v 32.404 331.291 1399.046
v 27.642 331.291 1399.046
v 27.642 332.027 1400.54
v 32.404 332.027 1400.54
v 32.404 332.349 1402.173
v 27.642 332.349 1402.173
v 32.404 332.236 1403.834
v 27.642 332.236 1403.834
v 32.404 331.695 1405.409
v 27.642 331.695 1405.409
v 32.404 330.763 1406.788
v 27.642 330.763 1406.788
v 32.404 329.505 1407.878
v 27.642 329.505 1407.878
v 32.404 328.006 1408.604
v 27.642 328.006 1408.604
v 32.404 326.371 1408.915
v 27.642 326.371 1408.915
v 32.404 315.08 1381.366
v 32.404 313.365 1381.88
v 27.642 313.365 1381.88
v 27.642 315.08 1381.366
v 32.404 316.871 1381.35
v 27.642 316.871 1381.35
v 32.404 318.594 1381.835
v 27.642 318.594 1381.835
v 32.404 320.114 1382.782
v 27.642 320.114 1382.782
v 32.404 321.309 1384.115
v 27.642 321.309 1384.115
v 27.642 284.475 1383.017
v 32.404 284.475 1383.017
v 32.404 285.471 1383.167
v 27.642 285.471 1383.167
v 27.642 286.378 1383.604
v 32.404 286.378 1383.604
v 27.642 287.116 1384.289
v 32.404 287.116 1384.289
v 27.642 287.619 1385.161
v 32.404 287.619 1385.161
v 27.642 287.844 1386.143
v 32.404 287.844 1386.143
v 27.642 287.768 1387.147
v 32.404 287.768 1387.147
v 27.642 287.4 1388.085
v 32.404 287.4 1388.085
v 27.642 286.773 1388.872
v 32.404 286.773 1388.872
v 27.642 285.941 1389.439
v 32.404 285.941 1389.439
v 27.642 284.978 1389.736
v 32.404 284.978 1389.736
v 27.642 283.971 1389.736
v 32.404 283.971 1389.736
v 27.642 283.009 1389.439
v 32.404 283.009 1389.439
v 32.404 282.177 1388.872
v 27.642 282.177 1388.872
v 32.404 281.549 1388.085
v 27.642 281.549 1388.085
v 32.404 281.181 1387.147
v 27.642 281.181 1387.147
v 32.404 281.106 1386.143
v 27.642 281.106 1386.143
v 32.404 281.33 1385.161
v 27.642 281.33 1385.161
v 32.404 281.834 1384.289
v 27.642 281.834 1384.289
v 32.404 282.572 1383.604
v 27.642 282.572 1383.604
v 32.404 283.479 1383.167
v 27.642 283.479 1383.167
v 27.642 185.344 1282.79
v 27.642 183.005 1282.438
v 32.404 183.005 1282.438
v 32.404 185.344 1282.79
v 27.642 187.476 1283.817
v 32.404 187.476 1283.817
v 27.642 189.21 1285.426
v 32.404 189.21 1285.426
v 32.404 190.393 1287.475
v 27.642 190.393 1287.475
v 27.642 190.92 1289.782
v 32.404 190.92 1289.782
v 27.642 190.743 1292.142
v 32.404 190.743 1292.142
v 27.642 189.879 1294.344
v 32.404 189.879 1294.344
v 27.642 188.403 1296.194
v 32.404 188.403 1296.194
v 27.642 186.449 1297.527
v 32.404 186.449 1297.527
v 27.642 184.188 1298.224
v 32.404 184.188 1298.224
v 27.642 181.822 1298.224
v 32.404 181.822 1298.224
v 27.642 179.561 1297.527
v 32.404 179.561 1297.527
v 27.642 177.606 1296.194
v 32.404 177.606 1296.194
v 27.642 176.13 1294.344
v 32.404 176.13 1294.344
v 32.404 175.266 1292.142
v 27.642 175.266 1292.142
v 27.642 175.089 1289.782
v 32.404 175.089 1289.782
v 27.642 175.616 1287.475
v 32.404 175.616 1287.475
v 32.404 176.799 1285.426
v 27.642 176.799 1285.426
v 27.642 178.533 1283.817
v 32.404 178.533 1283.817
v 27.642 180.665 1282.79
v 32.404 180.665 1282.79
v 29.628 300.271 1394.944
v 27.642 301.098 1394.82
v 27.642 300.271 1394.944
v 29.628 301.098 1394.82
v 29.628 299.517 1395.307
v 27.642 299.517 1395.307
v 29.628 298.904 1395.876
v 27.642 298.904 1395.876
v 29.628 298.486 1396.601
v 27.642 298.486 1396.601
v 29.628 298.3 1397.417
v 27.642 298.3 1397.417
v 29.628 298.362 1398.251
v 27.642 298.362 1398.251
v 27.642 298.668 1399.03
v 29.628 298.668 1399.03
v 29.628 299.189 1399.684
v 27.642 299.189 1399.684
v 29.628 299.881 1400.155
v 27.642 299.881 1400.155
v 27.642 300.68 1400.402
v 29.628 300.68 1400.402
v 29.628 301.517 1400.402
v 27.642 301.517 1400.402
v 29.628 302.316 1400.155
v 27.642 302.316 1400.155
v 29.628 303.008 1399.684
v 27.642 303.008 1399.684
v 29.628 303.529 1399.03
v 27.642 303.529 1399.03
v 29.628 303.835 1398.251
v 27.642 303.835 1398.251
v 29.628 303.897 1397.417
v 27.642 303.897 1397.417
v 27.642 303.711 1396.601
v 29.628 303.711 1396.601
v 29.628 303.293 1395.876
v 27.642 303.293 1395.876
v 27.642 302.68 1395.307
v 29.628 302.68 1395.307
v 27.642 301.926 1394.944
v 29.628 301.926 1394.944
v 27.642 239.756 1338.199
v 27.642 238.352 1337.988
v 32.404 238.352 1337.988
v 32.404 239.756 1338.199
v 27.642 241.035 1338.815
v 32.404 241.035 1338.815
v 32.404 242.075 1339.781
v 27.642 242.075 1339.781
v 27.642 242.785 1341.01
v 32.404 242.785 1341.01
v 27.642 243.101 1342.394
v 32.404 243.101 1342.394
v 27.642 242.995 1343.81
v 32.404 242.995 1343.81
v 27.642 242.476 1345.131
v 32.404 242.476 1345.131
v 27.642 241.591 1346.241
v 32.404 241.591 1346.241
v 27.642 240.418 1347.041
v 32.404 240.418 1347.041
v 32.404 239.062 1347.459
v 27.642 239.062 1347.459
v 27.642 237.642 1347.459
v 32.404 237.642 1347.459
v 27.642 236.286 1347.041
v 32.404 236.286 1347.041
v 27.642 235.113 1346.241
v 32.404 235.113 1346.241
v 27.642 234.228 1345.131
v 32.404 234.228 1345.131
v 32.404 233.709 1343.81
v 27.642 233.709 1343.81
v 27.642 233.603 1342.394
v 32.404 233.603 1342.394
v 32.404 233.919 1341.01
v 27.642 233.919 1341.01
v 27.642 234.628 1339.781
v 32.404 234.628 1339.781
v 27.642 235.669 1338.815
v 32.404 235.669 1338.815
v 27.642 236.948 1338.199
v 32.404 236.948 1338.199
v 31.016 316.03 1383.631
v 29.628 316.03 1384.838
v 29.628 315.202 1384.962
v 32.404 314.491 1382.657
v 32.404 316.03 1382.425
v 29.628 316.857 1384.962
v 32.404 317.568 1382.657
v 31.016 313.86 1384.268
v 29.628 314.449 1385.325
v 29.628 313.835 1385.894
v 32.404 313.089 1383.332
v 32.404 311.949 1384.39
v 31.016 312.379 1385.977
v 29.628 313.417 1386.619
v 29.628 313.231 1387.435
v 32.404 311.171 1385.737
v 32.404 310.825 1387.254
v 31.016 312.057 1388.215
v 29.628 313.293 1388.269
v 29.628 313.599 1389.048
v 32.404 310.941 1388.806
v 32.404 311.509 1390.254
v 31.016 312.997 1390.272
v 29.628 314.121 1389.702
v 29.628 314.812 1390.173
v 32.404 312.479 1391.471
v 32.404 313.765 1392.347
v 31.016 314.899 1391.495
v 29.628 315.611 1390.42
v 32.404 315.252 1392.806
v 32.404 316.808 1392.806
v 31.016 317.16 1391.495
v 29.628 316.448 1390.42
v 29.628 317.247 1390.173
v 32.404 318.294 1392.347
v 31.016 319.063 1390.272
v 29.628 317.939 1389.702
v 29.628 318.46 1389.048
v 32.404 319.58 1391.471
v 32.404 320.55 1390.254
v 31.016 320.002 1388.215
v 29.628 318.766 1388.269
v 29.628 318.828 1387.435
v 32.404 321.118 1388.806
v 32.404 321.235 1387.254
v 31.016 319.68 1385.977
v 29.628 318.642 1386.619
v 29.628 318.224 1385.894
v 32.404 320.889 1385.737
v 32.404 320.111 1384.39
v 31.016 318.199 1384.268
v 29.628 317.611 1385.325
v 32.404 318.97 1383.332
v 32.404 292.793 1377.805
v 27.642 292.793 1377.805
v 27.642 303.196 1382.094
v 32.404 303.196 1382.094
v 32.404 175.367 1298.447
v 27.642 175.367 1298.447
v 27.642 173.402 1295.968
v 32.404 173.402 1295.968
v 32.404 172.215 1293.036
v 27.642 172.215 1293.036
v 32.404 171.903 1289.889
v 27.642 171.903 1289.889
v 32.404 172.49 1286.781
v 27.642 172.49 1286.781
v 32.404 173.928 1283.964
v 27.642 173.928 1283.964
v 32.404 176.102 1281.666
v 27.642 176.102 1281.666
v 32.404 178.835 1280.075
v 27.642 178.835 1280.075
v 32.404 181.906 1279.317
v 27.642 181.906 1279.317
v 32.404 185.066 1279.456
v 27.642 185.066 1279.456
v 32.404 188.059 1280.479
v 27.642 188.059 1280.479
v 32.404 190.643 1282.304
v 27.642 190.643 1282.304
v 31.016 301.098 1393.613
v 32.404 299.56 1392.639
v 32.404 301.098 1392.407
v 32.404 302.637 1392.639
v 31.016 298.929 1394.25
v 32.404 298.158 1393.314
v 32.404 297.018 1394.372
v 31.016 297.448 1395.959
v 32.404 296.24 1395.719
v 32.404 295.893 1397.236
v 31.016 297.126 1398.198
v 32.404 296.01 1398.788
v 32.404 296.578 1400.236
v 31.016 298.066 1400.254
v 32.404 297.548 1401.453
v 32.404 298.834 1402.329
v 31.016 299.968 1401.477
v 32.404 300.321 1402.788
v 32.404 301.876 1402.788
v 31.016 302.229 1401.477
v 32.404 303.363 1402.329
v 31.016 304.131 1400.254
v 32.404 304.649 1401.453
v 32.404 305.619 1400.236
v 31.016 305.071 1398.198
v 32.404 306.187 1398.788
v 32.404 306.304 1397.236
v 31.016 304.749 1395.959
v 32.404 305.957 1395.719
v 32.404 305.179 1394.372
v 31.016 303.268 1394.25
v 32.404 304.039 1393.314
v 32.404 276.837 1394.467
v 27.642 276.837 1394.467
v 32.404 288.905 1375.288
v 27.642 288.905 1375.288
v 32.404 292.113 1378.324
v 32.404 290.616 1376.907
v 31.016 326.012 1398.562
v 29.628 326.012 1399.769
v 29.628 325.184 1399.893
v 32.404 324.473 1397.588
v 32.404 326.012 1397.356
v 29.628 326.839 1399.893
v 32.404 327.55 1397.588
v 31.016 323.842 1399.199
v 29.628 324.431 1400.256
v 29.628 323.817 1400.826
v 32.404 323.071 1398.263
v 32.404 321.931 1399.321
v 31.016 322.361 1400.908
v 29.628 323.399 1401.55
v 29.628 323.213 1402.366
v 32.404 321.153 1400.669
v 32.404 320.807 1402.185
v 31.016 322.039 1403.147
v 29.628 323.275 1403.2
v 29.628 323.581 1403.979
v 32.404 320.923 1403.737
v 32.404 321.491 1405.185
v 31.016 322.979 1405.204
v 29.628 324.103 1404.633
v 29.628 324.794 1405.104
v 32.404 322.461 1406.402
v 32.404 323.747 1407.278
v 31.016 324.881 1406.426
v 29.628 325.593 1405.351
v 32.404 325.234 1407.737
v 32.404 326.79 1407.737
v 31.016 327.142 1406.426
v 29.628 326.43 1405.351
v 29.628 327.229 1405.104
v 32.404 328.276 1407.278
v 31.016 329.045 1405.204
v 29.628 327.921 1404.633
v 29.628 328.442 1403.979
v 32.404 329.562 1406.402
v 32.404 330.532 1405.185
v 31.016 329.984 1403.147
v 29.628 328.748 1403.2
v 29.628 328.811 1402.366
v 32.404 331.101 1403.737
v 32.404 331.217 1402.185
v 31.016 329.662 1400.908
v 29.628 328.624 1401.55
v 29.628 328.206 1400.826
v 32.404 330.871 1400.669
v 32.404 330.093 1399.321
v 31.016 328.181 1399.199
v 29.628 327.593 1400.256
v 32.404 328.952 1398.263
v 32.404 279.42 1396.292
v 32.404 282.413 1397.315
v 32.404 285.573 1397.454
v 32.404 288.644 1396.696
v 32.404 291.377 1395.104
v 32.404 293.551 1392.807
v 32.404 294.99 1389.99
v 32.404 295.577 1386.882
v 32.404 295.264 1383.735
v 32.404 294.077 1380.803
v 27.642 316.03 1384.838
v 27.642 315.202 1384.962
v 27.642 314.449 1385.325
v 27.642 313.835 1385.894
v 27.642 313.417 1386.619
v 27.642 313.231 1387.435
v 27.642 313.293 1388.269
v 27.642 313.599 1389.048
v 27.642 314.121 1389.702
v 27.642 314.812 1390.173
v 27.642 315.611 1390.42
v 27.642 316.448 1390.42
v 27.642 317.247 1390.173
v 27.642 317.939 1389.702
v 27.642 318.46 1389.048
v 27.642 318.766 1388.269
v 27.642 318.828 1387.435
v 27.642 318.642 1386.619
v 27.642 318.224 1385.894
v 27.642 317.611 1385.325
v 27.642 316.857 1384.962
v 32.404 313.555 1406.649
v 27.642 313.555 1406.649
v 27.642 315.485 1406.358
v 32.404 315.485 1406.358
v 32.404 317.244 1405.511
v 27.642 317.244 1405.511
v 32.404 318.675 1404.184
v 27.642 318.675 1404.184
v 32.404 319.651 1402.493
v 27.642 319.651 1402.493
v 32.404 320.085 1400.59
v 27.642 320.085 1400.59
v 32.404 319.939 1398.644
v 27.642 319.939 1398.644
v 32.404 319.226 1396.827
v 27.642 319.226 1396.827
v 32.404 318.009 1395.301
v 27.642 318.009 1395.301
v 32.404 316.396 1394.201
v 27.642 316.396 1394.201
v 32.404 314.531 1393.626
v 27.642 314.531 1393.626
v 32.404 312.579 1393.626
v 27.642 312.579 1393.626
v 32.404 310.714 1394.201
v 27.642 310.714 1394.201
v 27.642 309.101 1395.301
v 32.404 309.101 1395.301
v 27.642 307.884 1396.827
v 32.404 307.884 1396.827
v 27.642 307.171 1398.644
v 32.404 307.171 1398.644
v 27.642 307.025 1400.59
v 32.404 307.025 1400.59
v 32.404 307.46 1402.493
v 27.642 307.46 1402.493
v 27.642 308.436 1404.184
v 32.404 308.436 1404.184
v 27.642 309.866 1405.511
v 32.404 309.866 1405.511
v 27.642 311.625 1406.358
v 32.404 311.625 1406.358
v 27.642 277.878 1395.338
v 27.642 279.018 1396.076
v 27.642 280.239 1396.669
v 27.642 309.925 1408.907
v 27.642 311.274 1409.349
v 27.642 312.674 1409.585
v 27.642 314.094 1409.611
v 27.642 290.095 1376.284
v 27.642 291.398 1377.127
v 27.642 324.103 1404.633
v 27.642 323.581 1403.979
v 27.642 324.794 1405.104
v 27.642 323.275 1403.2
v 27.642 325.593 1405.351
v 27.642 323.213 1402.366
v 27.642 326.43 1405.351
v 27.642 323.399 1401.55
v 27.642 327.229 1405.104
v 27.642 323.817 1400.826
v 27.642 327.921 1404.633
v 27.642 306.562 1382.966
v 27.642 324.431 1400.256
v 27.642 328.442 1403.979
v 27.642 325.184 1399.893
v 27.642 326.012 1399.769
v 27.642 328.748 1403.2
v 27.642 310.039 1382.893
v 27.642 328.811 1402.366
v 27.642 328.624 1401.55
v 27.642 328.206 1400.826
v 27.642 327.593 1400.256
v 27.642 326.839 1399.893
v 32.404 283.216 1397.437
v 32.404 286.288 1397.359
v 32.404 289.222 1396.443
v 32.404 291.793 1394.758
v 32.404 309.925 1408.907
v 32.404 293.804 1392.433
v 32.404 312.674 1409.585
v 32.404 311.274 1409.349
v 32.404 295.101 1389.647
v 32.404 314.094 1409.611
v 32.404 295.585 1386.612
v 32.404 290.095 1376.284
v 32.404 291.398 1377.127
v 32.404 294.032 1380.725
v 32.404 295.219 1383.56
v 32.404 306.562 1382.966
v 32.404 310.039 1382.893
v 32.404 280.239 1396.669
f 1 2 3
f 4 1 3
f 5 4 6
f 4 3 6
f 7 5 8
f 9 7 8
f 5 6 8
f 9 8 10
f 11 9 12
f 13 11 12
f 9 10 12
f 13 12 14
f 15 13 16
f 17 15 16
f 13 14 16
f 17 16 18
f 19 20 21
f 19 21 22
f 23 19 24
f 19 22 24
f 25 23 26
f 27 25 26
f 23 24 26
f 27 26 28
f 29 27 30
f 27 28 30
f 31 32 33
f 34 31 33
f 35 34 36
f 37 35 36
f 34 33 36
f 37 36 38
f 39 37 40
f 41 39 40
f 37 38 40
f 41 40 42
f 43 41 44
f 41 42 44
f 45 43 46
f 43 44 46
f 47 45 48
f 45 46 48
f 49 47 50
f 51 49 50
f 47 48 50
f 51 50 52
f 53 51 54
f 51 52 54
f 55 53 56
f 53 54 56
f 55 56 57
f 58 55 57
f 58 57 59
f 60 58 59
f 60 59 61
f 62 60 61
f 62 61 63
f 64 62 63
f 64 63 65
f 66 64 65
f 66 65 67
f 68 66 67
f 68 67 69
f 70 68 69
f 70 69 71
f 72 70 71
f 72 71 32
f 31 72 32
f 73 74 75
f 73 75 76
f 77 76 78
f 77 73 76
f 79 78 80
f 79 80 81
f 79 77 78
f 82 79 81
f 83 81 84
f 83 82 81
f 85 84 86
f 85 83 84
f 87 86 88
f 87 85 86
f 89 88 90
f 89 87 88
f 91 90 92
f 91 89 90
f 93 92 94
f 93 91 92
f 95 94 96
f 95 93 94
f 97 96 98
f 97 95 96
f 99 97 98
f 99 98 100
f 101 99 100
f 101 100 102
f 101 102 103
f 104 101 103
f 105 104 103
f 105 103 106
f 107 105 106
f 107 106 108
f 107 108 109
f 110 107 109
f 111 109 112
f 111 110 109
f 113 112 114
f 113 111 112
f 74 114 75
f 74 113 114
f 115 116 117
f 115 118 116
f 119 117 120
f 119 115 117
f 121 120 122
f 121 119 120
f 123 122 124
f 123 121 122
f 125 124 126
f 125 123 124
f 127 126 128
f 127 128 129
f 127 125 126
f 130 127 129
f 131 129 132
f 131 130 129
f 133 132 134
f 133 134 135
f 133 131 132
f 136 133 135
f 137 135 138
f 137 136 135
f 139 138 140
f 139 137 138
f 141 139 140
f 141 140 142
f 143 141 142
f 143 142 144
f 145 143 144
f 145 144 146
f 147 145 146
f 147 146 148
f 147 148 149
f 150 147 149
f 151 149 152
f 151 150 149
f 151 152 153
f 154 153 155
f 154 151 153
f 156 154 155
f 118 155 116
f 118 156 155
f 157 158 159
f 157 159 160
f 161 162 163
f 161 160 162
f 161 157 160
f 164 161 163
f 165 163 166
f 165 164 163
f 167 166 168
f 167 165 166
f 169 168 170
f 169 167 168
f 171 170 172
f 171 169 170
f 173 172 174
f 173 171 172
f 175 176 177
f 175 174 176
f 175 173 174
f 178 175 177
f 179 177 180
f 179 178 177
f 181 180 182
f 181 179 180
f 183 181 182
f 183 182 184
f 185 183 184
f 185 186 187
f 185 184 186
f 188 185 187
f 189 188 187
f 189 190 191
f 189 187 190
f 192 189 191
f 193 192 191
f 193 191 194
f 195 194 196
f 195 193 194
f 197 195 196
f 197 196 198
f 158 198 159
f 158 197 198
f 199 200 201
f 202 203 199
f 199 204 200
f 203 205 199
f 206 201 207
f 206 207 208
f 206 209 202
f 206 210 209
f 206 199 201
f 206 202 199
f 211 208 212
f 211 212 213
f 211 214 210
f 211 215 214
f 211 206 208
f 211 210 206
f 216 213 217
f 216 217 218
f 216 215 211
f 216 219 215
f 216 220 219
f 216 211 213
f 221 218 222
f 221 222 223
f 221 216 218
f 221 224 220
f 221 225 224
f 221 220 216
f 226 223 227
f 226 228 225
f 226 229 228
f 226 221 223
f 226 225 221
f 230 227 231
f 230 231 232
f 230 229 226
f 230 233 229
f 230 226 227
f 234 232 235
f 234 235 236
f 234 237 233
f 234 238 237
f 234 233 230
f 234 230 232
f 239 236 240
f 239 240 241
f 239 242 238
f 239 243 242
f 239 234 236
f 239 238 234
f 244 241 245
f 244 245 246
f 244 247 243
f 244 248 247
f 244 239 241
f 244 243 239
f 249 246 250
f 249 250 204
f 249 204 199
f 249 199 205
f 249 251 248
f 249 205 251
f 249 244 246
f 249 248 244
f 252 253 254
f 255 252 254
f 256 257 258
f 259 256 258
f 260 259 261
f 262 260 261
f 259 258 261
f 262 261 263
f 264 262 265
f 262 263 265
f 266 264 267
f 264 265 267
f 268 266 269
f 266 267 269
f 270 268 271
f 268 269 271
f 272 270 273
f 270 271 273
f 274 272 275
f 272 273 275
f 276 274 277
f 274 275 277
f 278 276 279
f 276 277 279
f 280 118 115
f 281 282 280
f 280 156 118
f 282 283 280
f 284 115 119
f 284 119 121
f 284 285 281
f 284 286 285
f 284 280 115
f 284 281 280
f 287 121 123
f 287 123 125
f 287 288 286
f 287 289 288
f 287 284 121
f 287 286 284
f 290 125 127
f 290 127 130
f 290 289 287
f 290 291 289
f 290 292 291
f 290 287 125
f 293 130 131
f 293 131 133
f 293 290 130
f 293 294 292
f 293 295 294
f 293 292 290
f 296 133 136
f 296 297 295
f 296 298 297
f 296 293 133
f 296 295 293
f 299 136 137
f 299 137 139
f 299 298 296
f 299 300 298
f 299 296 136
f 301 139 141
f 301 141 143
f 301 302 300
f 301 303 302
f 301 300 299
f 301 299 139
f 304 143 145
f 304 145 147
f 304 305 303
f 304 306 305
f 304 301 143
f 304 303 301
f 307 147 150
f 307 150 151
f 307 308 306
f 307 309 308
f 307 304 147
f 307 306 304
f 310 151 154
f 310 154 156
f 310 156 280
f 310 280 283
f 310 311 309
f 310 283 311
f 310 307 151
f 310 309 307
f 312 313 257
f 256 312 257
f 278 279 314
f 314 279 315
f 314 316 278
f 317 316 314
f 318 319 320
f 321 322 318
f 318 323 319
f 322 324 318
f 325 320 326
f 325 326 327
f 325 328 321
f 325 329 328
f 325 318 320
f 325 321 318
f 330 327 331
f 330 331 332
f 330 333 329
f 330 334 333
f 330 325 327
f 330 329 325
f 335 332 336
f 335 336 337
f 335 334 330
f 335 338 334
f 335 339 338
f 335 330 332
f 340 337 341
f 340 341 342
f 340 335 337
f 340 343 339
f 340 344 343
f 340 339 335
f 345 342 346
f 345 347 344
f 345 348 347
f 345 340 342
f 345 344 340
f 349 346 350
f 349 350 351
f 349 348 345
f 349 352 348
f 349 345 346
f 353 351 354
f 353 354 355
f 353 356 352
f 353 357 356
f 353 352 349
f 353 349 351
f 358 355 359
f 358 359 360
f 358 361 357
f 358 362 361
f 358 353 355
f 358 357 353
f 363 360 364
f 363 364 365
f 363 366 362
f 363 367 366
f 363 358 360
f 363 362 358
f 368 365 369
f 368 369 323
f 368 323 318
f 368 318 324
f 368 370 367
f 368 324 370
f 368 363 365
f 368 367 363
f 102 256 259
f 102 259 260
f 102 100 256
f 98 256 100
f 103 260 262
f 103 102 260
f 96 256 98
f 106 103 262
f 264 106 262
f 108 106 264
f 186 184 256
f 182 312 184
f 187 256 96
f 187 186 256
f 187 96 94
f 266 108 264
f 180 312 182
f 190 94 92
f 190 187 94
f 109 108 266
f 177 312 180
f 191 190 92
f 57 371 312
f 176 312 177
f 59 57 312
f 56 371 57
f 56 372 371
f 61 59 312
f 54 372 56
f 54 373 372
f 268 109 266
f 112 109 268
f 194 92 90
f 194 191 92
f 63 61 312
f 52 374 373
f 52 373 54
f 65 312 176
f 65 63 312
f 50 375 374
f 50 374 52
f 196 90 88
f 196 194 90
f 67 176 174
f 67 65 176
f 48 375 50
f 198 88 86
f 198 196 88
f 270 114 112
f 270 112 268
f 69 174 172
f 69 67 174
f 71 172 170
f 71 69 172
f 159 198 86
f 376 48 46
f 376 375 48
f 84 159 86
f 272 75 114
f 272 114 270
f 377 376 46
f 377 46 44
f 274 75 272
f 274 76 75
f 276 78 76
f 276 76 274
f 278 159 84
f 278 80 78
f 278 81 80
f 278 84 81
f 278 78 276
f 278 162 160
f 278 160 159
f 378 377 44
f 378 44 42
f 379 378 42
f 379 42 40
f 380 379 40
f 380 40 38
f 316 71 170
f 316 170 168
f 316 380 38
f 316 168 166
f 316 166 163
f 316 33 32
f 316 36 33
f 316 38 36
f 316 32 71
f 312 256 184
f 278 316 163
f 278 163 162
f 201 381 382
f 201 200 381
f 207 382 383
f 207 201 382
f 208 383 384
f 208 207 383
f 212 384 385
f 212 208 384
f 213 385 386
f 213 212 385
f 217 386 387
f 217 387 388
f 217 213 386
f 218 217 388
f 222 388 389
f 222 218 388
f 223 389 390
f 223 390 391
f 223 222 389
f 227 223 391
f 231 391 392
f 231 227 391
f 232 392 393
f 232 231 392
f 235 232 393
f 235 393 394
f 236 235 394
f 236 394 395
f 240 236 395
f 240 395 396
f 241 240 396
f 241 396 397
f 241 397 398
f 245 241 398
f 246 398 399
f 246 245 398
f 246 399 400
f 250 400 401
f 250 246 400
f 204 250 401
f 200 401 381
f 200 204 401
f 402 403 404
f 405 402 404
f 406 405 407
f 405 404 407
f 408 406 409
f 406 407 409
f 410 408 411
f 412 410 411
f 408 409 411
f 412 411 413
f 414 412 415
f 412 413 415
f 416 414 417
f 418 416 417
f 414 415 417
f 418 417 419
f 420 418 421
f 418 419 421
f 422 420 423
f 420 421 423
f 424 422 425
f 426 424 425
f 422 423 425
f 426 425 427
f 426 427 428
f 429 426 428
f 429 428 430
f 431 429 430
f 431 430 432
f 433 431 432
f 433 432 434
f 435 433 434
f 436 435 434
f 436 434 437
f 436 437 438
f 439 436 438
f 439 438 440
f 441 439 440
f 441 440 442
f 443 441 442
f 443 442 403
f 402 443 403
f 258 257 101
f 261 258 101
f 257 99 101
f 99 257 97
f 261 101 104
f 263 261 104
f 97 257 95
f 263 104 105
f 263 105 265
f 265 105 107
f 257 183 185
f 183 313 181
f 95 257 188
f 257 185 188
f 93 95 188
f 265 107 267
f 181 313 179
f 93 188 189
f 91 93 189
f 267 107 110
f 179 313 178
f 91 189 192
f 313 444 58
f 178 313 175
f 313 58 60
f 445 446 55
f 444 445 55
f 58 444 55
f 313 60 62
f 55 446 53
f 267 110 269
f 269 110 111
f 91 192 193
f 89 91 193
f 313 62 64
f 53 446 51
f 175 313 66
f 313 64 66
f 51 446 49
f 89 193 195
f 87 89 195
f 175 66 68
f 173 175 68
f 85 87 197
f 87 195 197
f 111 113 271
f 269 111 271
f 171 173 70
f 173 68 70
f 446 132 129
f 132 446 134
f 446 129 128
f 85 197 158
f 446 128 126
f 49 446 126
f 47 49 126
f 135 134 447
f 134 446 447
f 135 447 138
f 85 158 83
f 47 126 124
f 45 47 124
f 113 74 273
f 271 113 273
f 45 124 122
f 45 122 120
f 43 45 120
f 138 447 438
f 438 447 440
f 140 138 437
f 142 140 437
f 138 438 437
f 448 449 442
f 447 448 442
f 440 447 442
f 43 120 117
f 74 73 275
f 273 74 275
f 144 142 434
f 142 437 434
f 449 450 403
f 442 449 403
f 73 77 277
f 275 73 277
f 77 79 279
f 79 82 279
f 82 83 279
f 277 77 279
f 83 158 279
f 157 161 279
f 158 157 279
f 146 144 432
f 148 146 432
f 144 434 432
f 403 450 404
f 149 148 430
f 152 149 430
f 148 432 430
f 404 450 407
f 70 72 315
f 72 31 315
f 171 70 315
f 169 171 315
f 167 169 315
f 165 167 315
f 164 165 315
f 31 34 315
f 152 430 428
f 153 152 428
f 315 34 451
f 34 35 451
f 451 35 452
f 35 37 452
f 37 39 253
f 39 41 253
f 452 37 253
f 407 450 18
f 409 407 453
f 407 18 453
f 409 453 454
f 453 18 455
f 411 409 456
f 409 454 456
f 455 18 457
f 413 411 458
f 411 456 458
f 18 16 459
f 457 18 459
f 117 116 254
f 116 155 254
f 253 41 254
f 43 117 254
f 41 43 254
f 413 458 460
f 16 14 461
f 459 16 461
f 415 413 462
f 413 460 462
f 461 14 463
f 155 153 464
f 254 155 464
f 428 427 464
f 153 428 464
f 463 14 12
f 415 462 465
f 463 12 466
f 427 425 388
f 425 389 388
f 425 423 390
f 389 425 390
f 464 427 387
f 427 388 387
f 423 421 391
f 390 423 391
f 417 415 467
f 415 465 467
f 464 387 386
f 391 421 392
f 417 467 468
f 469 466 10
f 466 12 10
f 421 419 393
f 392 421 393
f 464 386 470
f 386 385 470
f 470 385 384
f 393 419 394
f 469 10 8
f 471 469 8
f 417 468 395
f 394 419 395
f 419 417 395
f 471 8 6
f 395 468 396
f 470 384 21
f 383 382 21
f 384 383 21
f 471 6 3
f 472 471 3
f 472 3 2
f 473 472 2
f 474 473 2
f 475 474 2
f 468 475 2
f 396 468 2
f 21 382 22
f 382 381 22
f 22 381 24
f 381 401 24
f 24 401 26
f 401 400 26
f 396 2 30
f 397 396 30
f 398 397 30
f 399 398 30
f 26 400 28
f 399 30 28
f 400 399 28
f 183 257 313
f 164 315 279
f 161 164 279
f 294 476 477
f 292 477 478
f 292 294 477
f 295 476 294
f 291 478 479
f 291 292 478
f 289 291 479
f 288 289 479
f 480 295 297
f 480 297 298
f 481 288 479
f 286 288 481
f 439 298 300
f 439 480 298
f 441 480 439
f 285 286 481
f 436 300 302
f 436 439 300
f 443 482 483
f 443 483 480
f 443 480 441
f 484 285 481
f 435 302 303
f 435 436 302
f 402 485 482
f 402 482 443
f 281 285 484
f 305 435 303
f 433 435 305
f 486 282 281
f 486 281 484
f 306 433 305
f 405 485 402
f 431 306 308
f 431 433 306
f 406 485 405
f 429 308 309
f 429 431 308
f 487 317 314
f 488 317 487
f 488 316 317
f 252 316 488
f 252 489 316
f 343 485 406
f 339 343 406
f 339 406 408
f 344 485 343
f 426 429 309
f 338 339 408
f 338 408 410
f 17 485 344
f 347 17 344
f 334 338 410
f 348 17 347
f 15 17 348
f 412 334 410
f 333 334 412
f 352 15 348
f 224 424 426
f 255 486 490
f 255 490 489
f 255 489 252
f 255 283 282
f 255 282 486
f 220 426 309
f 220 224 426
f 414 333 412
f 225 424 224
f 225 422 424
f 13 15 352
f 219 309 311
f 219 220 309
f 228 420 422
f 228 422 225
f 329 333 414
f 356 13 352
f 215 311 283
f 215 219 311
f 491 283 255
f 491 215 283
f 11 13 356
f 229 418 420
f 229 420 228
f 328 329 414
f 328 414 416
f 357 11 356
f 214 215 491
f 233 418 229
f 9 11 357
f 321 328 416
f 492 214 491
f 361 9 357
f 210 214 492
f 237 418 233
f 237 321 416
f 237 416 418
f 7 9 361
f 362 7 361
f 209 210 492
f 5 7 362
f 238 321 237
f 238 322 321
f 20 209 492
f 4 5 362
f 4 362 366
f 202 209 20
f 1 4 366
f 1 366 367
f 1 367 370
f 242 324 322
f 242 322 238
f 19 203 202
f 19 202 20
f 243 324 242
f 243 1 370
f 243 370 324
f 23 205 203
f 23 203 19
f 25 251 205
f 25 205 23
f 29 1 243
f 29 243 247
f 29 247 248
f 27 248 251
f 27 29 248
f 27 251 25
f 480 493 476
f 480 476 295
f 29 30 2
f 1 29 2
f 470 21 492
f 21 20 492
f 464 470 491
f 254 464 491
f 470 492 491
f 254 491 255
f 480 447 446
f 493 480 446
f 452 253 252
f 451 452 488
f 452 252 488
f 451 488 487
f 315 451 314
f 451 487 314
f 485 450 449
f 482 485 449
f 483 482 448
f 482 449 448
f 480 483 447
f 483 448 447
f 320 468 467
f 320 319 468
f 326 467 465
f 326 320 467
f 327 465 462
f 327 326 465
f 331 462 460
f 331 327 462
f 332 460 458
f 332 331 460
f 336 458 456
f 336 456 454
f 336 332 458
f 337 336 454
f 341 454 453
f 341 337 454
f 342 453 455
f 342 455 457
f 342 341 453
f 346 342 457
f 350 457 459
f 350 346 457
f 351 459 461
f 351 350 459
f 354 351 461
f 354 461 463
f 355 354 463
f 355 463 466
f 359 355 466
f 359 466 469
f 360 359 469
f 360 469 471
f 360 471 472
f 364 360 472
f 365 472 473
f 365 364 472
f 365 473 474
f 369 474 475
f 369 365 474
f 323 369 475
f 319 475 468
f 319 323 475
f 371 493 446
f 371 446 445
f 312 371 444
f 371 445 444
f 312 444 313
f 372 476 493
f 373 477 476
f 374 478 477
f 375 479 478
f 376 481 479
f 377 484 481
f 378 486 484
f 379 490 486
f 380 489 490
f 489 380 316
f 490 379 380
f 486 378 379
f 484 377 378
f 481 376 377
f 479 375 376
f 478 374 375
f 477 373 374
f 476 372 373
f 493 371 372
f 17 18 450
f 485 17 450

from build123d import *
from OCP.BRepAlgoAPI import BRepAlgoAPI_Cut
from OCP.TopTools import TopTools_ListOfShape

# Parameters (mm, degrees)
BOSS_EXTRUDE1_START                         = 27.641612
SKETCH1_R                                   = 7.9375
BOSS_EXTRUDE1_DEPTH                         = 4.762501
F_1_4_CLEARANCE_HOLE1_D                     = 6.7564
CUT_EXTRUDE1_DEPTH                          = 1429.793432694
CUT_EXTRUDE1_DEPTH_BACK                     = 1429.793432694
SKETCH4_R                                   = 4.7625
BOSS_EXTRUDE2_START                         = 27.641612
BOSS_EXTRUDE2_DEPTH                         = 4.7625
F_1_2_CLEARANCE_HOLE1_D                     = 13.09624
CSK_FOR_10_FLAT_HEAD_SOCKET_CAP_SCR_2_COUNT = 2
CSK_FOR_10_FLAT_HEAD_SOCKET_CAP_SCR_2_PITCH = 17.960512242
CSK_FOR_10_FLAT_HEAD_SOCKET_CAP_SCR_3_COUNT = 2
CSK_FOR_10_FLAT_HEAD_SOCKET_CAP_SCR_3_PITCH = 25.4
FILLET1_R                                   = 12.7


with BuildPart() as part:
    # Sketch1 → Boss-Extrude1 (new body)
    with BuildSketch(Plane(origin=(0, 0, 0), x_dir=(0, 0, -1), z_dir=(1, 0, 0)).offset(BOSS_EXTRUDE1_START)):
        with BuildLine():
            Line((-1394.467062617, 276.836816997), (-1298.446828577, 175.366601392))
            ThreePointArc((-1298.446828577, 175.366601392), (-1282.737360992, 174.933080131), (-1282.303839731, 190.642547716))
            Line((-1282.303839731, 190.642547716), (-1378.32407377, 292.112763322))
            ThreePointArc((-1378.32407377, 292.112763322), (-1394.033541356, 292.546284583), (-1394.467062617, 276.836816997))
        make_face()
        with Locations((-1290.375334154, 183.004574554)):
            Circle(SKETCH1_R, mode=Mode.SUBTRACT)
    extrude(amount=BOSS_EXTRUDE1_DEPTH)

    # 1/4 Clearance Hole1 (through all)
    with Locations(Plane.ZY.offset(-27.641612484)):
        with Locations((1386.395568193, 284.47479016)):
            Hole(F_1_4_CLEARANCE_HOLE1_D / 2)

    # Sketch4 → Cut-Extrude1 (cut, two sides: drawn at the far end of the back side and taken through both)
    with BuildSketch(Plane(origin=(0, 0, 0), x_dir=(0, 0, -1), z_dir=(1, 0, 0)).offset(-CUT_EXTRUDE1_DEPTH_BACK)):
        with Locations((-1342.750007266, 238.351964884)):
            Circle(SKETCH4_R)
    extrude(amount=CUT_EXTRUDE1_DEPTH + CUT_EXTRUDE1_DEPTH_BACK, mode=Mode.SUBTRACT)

    # Sketch5 → Boss-Extrude2 (add)
    with BuildSketch(Plane(origin=(0, 0, 0), x_dir=(0, 0, -1), z_dir=(1, 0, 0)).offset(BOSS_EXTRUDE2_START)):
        with BuildLine():
            Line((-1408.915317884, 326.37077483), (-1409.610698903, 314.093730387))
            ThreePointArc((-1409.610698903, 314.093730387), (-1409.493080384, 311.969736982), (-1408.907003916, 309.924817308))
            Line((-1408.907003916, 309.924817308), (-1396.669308063, 280.239471359))
            ThreePointArc((-1396.669308063, 280.239471359), (-1392.433468222, 293.803853322), (-1378.32407377, 292.112763322))
            Line((-1378.32407377, 292.112763322), (-1376.907390708, 290.615671201))
            Line((-1376.907390708, 290.615671201), (-1385.003560397, 310.254792894))
            ThreePointArc((-1385.003560397, 310.254792894), (-1381.314759969, 315.520916186), (-1384.1151615, 321.308580171))
            Line((-1384.1151615, 321.308580171), (-1399.046290774, 331.290632995))
            ThreePointArc((-1399.046290774, 331.290632995), (-1405.408532388, 331.694665931), (-1408.915317884, 326.37077483))
        make_face()
    extrude(amount=BOSS_EXTRUDE2_DEPTH)

    # 1/2 Clearance Hole1 (through all)
    with Locations(Plane(origin=(32.404112484, 0, 0), x_dir=(0, 0, -1), z_dir=(1, 0, 0))):
        with Locations((-1400.10094117, 313.555090566)):
            Hole(F_1_2_CLEARANCE_HOLE1_D / 2)


with BuildPart() as csk_for_10_flat_head_socket_cap_screw1_tool:
    # Sketch10 → CSK for #10 Flat Head Socket Cap Screw1 (revolve)
    with BuildSketch(Plane(origin=(32.404112484, 326.011681615, 1402.575479395), x_dir=(0, 0, -1), z_dir=(0, 1, 0))):
        Polygon((0, 0), (0, 4.7625), (2.8067, 4.7625), (2.8067, 2.775838967), (5.2197, 0), align=None)
    csk_for_10_flat_head_socket_cap_screw1 = revolve(axis=Axis((38.754112484, 326.011681615, 1402.575479395), (-1, 0, 0)))


with BuildPart() as part_1:
    add(part.part)

    # CSK for #10 Flat Head Socket Cap Screw1: cut by csk_for_10_flat_head_socket_cap_screw1_tool, with a tolerance
    csk_for_10_flat_head_socket_cap_screw1_stock = TopTools_ListOfShape()
    csk_for_10_flat_head_socket_cap_screw1_stock.Append(part_1.part.wrapped)
    csk_for_10_flat_head_socket_cap_screw1_tools = TopTools_ListOfShape()
    csk_for_10_flat_head_socket_cap_screw1_tools.Append(csk_for_10_flat_head_socket_cap_screw1_tool.part.wrapped)
    csk_for_10_flat_head_socket_cap_screw1_cut = BRepAlgoAPI_Cut()
    csk_for_10_flat_head_socket_cap_screw1_cut.SetArguments(csk_for_10_flat_head_socket_cap_screw1_stock)
    csk_for_10_flat_head_socket_cap_screw1_cut.SetTools(csk_for_10_flat_head_socket_cap_screw1_tools)
    csk_for_10_flat_head_socket_cap_screw1_cut.SetFuzzyValue(0.00001)
    csk_for_10_flat_head_socket_cap_screw1_cut.Build()
    add(Compound.cast(csk_for_10_flat_head_socket_cap_screw1_cut.Shape()).solids(), mode=Mode.REPLACE)

    # CSK for _10 Flat Head Socket Cap Scr 2: CSK for #10 Flat Head Socket Cap Screw1 ×2
    with Locations(*[Vector(0, -0.5557777356316841, -0.8313309260313356) * (i * CSK_FOR_10_FLAT_HEAD_SOCKET_CAP_SCR_2_PITCH) for i in range(1, CSK_FOR_10_FLAT_HEAD_SOCKET_CAP_SCR_2_COUNT)]):
        add(csk_for_10_flat_head_socket_cap_screw1, mode=Mode.SUBTRACT)

    # CSK for _10 Flat Head Socket Cap Scr 3: CSK for #10 Flat Head Socket Cap Screw1 ×2
    with Locations(*[Vector(0, -0.9808339409045171, -0.19484552950918363) * (i * CSK_FOR_10_FLAT_HEAD_SOCKET_CAP_SCR_3_PITCH) for i in range(1, CSK_FOR_10_FLAT_HEAD_SOCKET_CAP_SCR_3_COUNT)]):
        add(csk_for_10_flat_head_socket_cap_screw1, mode=Mode.SUBTRACT)

    # Fillet1
    fillet1_edges = [part_1.edges().sort_by_distance(p)[0] for p in [
        (30.022862, 290.615671201, 1376.907390708),
        (30.022862, 310.254792894, 1385.003560397),
    ]]
    fillet(fillet1_edges, radius=FILLET1_R)


solid = part_1.part
